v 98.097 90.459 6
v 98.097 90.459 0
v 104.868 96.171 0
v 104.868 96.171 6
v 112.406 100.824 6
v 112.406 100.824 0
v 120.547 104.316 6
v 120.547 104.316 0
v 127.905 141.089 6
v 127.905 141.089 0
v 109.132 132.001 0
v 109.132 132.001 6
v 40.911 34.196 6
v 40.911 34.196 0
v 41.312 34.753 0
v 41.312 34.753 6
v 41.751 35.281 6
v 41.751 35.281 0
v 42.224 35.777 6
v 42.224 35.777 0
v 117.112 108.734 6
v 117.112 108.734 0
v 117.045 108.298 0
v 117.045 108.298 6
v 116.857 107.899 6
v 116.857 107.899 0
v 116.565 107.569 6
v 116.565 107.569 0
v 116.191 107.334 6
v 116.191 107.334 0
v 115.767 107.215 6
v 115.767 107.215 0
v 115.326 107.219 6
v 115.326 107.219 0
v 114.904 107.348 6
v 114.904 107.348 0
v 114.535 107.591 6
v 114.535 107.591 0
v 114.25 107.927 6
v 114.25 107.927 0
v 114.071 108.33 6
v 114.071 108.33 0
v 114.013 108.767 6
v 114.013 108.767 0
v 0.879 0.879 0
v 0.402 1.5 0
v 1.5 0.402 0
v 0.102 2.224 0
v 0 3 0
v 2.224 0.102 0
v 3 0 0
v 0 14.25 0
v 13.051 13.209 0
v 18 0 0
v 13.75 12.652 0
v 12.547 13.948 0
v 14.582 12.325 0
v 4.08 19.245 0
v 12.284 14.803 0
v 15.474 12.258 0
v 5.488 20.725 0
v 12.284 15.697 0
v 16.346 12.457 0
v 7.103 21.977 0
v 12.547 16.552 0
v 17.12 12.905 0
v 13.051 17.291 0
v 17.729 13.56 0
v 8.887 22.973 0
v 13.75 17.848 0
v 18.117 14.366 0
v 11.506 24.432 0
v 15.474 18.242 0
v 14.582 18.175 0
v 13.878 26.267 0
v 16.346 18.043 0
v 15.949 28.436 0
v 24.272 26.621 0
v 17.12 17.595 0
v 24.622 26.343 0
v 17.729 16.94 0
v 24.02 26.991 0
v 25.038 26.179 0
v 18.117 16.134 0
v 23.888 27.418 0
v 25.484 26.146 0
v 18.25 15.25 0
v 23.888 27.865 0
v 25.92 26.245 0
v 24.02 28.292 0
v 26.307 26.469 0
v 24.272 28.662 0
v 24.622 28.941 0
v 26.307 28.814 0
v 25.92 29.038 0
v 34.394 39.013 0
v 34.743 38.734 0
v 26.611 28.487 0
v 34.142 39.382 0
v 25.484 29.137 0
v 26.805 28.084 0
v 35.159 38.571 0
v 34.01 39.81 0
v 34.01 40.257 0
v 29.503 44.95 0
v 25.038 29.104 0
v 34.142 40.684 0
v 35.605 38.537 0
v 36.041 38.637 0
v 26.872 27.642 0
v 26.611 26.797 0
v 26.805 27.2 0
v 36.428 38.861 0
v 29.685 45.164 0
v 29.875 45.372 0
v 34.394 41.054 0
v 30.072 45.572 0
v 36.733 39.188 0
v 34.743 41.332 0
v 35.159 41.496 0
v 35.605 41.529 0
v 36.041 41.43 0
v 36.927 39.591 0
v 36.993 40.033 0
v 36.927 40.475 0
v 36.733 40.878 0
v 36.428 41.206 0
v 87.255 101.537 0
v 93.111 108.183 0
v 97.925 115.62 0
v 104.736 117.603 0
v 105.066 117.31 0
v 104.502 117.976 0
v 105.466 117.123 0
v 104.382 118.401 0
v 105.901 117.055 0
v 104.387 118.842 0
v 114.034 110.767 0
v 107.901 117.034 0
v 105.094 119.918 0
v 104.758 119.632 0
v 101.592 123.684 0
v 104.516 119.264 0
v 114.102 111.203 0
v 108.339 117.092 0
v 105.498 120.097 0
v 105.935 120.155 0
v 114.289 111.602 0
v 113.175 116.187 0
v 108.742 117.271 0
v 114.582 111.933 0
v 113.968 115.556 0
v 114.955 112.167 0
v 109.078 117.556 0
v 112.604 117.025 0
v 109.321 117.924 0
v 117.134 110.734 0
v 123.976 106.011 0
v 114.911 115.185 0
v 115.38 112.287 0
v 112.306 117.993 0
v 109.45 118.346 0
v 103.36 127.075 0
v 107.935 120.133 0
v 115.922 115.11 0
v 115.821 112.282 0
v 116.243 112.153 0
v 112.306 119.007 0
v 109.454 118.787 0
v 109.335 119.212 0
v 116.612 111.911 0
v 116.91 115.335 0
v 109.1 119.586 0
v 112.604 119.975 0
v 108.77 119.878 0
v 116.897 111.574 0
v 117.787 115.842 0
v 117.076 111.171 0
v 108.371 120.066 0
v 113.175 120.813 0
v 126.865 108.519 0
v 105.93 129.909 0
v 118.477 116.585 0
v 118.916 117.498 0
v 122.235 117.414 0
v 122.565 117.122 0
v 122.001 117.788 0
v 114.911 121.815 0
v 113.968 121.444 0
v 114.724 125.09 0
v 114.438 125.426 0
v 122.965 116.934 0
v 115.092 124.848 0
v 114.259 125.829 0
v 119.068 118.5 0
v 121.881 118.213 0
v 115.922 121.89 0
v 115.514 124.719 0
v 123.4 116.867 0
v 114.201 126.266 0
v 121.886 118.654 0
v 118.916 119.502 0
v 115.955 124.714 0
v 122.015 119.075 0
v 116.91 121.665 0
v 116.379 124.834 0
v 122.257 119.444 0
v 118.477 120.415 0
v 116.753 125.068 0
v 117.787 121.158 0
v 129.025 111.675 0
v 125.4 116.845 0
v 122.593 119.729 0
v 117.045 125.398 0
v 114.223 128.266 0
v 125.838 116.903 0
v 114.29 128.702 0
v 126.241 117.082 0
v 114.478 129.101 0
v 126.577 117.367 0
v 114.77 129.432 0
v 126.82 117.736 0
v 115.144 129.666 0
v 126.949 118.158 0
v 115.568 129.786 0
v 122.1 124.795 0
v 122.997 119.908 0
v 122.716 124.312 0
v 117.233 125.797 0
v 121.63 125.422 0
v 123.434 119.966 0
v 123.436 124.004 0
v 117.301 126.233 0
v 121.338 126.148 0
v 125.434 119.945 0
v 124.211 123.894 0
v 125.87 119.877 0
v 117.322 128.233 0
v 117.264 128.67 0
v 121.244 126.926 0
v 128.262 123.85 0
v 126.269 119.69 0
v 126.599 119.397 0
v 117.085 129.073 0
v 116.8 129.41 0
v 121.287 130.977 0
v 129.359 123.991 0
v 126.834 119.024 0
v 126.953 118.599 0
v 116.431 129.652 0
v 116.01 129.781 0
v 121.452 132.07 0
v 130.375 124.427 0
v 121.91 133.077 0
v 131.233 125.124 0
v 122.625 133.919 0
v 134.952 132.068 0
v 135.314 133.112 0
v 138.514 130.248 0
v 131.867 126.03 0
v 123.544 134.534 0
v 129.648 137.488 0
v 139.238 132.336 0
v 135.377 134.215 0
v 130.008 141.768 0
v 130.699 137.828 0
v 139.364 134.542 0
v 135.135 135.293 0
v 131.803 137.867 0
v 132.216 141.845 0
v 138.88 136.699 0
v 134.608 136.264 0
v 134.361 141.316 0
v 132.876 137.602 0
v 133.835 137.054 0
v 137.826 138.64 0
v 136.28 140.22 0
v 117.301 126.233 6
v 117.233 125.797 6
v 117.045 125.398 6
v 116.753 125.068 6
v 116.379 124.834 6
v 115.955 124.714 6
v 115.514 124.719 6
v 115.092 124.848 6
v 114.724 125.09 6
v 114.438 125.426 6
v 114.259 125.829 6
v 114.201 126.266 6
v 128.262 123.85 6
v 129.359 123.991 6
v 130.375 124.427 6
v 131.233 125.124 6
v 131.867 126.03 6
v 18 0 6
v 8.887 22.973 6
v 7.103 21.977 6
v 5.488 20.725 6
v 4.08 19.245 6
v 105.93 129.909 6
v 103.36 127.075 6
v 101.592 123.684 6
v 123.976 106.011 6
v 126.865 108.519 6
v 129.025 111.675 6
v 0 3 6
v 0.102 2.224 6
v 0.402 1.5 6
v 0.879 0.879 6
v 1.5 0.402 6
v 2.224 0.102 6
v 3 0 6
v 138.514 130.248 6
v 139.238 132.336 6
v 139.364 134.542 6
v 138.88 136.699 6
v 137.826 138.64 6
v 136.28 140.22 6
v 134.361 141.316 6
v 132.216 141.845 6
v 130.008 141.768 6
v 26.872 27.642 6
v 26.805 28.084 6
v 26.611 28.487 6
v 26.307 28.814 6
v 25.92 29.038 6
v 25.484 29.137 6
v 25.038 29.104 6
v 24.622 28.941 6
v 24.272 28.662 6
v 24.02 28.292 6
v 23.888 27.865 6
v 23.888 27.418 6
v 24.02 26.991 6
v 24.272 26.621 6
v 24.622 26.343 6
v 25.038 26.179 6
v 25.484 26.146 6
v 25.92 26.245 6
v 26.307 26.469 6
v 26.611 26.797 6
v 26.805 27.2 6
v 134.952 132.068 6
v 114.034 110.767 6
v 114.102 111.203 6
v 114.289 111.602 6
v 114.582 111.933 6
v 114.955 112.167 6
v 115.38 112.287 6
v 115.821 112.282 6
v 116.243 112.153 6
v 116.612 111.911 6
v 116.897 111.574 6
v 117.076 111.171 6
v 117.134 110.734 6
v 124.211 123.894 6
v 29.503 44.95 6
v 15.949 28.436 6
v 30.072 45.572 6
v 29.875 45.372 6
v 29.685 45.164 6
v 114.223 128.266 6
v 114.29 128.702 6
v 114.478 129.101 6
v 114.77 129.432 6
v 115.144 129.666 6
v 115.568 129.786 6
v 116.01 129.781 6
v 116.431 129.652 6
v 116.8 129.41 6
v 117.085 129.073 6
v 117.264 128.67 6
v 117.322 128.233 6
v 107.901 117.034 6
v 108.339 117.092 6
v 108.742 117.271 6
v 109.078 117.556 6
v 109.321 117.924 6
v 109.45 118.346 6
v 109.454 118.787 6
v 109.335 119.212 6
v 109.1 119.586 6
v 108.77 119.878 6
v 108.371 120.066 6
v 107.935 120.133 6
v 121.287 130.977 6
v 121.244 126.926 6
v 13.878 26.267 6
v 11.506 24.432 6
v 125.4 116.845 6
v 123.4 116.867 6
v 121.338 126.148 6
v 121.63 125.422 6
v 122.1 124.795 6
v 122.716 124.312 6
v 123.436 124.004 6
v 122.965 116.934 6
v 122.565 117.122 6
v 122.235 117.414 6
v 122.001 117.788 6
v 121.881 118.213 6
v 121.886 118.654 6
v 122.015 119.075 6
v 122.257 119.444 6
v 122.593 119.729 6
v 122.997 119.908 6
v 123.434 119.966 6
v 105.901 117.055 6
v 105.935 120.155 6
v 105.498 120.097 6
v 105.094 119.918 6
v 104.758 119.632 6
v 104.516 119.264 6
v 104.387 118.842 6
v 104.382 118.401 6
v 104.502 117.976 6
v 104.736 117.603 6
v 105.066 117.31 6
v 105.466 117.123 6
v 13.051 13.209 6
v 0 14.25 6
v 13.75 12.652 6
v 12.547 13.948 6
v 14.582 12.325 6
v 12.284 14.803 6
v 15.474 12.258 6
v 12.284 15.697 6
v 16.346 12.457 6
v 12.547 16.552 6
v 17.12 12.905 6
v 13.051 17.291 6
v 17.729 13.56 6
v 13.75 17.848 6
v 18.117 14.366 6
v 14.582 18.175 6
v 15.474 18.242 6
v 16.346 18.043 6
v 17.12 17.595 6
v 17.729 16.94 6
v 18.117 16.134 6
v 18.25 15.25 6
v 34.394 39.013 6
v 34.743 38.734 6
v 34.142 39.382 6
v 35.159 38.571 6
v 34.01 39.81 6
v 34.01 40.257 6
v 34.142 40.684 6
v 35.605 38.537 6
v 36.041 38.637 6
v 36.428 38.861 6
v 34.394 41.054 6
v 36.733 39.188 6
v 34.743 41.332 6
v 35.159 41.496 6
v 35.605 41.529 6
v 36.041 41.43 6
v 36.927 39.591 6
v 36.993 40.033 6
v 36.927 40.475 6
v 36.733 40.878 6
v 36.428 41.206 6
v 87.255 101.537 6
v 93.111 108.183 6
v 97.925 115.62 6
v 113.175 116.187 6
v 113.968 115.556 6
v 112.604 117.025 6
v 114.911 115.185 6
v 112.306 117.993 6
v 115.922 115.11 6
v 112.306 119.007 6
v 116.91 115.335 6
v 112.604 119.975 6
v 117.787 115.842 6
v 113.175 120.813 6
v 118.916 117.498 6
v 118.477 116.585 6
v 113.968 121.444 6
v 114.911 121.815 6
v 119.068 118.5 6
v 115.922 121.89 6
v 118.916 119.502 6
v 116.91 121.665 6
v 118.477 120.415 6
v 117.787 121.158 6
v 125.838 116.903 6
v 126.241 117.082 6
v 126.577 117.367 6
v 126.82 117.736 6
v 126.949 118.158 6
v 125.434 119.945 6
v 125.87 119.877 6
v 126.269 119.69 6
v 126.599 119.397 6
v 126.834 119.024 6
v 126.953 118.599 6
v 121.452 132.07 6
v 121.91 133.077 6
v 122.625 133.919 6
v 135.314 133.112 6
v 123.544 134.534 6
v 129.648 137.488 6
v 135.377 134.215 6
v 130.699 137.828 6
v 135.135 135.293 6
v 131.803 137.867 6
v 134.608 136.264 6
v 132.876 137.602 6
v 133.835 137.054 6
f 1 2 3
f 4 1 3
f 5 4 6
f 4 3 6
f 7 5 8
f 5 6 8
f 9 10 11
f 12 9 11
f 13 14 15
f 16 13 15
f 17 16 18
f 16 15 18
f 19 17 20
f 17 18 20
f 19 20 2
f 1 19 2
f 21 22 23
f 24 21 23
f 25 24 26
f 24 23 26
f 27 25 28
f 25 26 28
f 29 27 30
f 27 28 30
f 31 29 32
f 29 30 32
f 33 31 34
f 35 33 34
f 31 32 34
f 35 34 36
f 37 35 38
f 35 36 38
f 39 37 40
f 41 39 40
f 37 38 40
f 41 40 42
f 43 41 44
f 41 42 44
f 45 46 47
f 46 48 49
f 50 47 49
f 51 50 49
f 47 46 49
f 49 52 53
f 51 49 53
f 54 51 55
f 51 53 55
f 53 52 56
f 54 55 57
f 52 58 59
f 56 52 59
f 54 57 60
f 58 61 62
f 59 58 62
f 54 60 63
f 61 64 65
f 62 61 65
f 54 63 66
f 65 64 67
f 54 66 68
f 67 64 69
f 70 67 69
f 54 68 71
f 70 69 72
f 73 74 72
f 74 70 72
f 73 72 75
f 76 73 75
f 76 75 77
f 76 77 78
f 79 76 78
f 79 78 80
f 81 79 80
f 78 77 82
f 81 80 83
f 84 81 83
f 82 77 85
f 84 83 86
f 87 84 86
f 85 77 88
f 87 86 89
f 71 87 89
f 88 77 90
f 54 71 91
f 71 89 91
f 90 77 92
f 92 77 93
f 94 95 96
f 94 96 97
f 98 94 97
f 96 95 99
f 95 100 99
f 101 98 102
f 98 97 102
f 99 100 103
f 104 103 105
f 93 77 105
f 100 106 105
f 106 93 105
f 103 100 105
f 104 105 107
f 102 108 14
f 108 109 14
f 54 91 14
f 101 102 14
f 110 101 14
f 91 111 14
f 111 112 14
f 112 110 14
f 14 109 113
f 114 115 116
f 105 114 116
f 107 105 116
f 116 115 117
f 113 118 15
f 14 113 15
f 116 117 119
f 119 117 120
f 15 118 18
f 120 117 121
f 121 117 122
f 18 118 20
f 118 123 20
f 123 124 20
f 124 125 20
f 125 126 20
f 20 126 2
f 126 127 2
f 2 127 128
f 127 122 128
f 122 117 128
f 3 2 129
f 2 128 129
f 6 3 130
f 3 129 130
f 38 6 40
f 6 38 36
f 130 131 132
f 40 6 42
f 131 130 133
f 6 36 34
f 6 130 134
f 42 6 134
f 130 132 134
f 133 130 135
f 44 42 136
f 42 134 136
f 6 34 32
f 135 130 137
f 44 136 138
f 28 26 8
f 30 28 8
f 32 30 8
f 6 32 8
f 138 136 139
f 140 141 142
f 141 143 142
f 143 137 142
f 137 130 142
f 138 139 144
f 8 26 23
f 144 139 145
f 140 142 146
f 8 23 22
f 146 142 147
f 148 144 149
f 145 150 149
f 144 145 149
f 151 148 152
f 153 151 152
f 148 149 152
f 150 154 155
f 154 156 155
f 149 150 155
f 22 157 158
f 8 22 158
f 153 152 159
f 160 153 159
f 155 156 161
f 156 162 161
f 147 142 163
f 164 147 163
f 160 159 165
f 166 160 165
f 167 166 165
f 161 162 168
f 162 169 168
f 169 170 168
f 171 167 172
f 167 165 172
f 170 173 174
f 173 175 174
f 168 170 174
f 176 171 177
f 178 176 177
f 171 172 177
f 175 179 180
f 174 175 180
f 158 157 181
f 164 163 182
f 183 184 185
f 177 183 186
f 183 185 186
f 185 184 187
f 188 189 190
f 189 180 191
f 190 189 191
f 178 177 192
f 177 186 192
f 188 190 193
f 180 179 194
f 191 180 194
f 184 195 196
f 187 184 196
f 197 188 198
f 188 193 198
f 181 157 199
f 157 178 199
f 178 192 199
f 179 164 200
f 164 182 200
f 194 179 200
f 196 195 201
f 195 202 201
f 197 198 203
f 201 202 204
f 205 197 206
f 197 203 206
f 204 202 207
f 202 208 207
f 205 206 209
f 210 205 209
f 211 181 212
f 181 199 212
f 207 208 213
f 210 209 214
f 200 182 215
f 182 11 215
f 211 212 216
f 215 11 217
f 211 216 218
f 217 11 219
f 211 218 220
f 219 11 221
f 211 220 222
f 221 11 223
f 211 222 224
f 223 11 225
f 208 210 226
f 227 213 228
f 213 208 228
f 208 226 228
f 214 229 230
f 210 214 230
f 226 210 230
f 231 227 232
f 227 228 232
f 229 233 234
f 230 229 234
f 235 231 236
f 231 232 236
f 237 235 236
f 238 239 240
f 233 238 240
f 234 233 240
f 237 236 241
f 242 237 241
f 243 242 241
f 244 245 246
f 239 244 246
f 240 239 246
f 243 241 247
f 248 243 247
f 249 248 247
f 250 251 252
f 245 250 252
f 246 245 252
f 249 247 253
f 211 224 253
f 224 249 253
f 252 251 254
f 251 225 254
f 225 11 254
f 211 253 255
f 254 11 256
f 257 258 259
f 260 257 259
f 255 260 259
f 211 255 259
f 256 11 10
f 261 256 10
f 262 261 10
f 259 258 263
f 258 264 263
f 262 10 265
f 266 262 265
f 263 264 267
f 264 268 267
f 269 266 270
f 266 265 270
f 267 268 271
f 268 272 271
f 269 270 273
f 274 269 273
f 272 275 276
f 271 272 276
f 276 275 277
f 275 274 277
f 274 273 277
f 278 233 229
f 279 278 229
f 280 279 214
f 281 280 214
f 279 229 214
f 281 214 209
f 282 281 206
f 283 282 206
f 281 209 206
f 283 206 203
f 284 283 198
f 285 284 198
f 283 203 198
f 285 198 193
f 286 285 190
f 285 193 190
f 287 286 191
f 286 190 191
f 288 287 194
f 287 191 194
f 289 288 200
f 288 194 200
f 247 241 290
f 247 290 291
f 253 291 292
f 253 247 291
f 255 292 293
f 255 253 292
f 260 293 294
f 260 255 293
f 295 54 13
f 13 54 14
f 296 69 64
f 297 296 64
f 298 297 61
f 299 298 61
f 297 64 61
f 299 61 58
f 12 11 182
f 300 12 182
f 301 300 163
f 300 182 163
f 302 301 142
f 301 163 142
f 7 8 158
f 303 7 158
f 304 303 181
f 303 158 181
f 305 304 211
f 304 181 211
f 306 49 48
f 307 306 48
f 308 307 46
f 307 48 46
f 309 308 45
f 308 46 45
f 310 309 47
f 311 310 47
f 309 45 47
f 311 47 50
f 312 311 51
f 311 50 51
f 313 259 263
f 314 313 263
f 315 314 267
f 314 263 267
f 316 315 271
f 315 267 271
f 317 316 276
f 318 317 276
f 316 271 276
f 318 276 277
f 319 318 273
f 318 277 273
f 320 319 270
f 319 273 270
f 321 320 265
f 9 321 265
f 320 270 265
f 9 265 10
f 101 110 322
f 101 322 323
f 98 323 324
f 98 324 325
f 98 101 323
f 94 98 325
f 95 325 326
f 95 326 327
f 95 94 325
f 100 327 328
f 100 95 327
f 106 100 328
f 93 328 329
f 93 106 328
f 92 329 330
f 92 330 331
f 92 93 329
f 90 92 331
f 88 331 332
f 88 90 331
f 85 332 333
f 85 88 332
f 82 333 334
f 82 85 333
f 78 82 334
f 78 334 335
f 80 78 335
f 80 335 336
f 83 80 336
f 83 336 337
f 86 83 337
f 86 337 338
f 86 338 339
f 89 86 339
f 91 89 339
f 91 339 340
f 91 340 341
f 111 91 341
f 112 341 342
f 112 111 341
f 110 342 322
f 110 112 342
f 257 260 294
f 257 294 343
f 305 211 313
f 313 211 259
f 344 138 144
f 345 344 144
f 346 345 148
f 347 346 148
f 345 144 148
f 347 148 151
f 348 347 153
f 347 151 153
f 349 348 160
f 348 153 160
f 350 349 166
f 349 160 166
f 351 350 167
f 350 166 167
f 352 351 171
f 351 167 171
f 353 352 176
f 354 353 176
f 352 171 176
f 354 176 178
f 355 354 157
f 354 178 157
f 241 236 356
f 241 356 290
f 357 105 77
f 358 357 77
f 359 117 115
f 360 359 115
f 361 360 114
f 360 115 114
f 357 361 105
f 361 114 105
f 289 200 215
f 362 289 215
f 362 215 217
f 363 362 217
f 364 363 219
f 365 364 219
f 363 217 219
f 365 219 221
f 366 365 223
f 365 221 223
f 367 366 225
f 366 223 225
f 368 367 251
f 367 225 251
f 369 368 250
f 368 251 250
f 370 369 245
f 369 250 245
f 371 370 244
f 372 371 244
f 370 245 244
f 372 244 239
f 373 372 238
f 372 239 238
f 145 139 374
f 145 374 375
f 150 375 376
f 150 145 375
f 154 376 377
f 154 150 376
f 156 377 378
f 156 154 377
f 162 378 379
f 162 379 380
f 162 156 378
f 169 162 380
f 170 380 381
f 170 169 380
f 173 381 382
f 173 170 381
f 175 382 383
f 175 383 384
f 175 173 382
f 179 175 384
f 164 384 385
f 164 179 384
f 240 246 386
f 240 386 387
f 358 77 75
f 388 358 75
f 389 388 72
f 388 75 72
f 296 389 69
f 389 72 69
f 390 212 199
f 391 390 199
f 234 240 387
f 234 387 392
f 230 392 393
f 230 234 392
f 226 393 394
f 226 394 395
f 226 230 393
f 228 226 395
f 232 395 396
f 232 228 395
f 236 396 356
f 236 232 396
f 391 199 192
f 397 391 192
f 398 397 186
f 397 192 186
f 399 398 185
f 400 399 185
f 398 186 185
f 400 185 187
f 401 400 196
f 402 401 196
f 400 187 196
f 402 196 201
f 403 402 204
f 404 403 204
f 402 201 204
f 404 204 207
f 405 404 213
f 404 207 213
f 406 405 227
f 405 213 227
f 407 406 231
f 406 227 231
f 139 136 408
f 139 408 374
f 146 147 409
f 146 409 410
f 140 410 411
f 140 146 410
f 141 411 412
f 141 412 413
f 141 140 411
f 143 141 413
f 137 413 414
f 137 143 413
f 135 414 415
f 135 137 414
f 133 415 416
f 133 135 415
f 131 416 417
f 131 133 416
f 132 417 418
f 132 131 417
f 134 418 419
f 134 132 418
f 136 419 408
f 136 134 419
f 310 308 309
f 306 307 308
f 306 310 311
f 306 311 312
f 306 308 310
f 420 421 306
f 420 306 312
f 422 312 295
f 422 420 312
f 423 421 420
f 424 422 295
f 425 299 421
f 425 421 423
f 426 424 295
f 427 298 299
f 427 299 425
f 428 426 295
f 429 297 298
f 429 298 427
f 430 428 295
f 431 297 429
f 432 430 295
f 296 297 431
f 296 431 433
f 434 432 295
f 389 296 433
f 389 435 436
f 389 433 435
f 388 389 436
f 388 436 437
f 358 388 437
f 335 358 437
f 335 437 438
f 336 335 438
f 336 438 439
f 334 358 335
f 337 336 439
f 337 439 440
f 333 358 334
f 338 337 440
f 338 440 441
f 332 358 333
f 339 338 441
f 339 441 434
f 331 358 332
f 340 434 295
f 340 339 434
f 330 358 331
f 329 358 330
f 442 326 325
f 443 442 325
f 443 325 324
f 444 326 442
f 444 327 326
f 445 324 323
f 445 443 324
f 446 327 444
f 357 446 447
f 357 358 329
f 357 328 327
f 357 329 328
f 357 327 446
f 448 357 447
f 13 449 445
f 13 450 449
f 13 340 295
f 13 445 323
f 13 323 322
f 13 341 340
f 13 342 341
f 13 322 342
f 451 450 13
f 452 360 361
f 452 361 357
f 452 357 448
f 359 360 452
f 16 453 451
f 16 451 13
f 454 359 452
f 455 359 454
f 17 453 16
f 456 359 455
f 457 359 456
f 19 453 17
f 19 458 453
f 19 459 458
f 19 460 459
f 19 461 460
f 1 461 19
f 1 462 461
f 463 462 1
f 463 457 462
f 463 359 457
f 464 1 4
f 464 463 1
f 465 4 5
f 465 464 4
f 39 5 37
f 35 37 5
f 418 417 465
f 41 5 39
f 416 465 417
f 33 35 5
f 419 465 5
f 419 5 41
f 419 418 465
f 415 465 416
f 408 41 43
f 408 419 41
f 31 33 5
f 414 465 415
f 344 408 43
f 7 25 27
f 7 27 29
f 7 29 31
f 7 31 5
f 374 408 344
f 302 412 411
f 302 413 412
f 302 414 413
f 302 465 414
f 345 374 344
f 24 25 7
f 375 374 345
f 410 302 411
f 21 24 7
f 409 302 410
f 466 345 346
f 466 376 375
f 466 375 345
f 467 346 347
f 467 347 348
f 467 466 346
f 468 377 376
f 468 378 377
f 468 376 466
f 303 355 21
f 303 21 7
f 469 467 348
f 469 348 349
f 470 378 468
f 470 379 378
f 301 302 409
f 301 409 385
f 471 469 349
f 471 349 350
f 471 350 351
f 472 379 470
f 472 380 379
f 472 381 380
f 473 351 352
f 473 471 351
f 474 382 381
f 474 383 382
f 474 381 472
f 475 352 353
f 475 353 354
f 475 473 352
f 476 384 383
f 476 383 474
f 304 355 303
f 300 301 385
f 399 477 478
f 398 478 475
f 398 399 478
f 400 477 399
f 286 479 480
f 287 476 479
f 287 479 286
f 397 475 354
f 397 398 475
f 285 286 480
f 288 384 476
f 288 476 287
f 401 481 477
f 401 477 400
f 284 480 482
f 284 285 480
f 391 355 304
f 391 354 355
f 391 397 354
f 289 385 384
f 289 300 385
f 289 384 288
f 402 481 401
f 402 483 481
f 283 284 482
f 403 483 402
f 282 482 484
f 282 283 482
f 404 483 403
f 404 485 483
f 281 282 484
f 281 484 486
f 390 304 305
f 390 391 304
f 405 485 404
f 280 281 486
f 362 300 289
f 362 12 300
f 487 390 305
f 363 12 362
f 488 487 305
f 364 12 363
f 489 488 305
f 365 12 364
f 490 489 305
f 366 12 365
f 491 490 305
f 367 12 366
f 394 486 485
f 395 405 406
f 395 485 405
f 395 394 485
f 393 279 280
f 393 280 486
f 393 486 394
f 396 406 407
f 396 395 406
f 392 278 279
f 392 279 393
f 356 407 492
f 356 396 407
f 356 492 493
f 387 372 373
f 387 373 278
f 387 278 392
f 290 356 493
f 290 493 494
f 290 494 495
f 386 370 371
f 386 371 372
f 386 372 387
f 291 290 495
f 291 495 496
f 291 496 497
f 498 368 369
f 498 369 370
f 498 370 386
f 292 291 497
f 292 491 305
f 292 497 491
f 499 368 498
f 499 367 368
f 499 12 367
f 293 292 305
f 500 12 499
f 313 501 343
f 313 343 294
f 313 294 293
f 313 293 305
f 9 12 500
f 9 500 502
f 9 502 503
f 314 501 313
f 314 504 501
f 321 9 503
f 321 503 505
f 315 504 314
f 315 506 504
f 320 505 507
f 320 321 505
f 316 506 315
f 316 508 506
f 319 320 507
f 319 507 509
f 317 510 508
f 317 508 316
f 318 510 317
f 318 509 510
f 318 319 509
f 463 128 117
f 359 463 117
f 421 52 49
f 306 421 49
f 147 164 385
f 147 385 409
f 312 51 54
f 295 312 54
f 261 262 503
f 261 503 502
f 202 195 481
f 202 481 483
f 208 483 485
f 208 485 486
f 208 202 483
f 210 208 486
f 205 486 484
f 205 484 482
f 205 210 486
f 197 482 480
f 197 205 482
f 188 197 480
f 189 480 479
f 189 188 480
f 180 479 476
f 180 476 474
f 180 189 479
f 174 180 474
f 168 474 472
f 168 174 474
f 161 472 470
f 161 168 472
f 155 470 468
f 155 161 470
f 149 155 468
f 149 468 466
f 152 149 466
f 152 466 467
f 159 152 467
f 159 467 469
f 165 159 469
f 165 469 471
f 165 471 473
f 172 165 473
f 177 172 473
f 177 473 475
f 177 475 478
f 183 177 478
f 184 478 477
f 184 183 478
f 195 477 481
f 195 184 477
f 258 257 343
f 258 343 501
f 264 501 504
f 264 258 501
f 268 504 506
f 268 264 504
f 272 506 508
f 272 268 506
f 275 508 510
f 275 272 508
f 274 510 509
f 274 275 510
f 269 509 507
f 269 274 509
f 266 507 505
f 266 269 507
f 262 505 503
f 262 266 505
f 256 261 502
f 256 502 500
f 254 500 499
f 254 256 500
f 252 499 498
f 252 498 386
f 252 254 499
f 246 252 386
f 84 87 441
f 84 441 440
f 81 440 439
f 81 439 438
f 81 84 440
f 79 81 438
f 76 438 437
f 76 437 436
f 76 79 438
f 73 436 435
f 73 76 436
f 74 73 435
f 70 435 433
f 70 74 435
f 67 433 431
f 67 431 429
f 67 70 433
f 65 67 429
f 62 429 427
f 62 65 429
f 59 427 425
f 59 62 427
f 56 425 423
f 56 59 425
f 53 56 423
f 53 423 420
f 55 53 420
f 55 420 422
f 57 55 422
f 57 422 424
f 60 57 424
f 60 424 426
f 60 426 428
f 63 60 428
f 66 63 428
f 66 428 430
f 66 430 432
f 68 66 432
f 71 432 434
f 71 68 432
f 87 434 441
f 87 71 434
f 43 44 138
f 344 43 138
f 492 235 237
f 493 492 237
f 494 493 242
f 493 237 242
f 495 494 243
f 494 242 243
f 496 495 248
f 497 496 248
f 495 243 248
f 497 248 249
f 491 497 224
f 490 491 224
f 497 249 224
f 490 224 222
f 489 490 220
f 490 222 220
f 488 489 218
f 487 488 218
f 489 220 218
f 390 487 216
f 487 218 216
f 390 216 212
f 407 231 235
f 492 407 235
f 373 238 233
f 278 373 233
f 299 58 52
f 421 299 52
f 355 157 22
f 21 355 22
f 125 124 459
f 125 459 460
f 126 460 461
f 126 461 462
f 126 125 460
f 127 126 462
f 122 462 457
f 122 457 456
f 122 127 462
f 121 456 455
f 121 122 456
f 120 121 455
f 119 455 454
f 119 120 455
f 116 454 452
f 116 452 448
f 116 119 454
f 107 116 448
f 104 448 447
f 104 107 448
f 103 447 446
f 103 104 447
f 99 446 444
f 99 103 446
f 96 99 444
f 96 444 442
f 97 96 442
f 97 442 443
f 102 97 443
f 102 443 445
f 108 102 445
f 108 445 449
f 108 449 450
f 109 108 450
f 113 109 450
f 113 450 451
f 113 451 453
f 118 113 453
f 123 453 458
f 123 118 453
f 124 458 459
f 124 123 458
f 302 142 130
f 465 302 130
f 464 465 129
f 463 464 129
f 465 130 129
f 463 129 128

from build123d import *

# Parameters (mm, degrees)
CROQUIS1_R              = 1.5
CROQUIS1_R_2            = 3
CROQUIS1_R_3            = 3.4
SALIENTE_EXTRUIR1_DEPTH = 6


with BuildPart() as part:
    # Croquis1 → Saliente-Extruir1 (new body)
    with BuildSketch(Plane.XY):
        with BuildLine():
            Line((8.1e-08, 14.249999874), (8.1e-08, 2.999999874))
            ThreePointArc((8.1e-08, 2.999999874), (0.878679737, 0.87867953), (3.000000081, -1.26e-07))
            Line((3.000000081, -1.26e-07), (18.000000081, -1.26e-07))
            Line((18.000000081, -1.26e-07), (40.911193324, 34.196329551))
            ThreePointArc((40.911193324, 34.196329551), (41.527076457, 35.020483475), (42.224381081, 35.776993874))
            Line((42.224381081, 35.776993874), (98.096843081, 90.459473874))
            ThreePointArc((98.096843081, 90.459473874), (108.550843923, 98.63680641), (120.546851363, 104.315776961))
            ThreePointArc((120.546851363, 104.315776961), (125.500442362, 107.172433842), (129.025046114, 111.675290792))
            Line((129.025046114, 111.675290792), (138.514418989, 130.248169023))
            ThreePointArc((138.514418989, 130.248169023), (137.107819922, 139.483655494), (127.90475, 141.088721))
            Line((127.90475, 141.088721), (109.131917, 132.001327))
            ThreePointArc((109.131917, 132.001327), (104.554236665, 128.574463552), (101.591616002, 123.683509744))
            ThreePointArc((101.591616002, 123.683509744), (95.655747756, 111.812521161), (87.255287964, 101.536959032))
            Line((87.255287964, 101.536959032), (30.072463964, 45.572027032))
            ThreePointArc((30.072463964, 45.572027032), (29.779023988, 45.268761189), (29.502525894, 44.949972866))
            Line((29.502525894, 44.949972866), (15.949120522, 28.43588954))
            ThreePointArc((15.949120522, 28.43588954), (12.726828906, 25.305121034), (8.887000234, 22.972613701))
            ThreePointArc((8.887000234, 22.972613701), (6.271558617, 21.381766549), (4.079708958, 19.244683353))
            Line((4.079708958, 19.244683353), (8.1e-08, 14.249999874))
        make_face()
        with Locations((25.371621, 27.641642)):
            Circle(CROQUIS1_R, mode=Mode.SUBTRACT)
        with Locations((35.493241781, 40.03328422)):
            Circle(CROQUIS1_R, mode=Mode.SUBTRACT)
        with Locations((15.25, 15.25)):
            Circle(CROQUIS1_R_2, mode=Mode.SUBTRACT)
        with Locations((115.667525989, 118.500000023)):
            Circle(CROQUIS1_R_3, mode=Mode.SUBTRACT)
        with BuildLine():
            Line((105.901407198, 117.055029782), (107.901292, 117.033504))
            ThreePointArc((107.901292, 117.033504), (109.4678845, 118.5667315), (107.934657, 120.133324))
            Line((107.934657, 120.133324), (105.934773, 120.15485))
            ThreePointArc((105.934773, 120.15485), (104.368758386, 118.621616566), (105.901407198, 117.055029782))
        make_face(mode=Mode.SUBTRACT)
        with BuildLine():
            Line((114.012675, 108.767248), (114.034201, 110.767132))
            ThreePointArc((114.034201, 110.767132), (115.6007945, 112.3003595), (117.134022, 110.733766))
            Line((117.134022, 110.733766), (117.112495218, 108.733882198))
            ThreePointArc((117.112495218, 108.733882198), (115.545908434, 107.201233386), (114.012675, 108.767248))
        make_face(mode=Mode.SUBTRACT)
        with BuildLine():
            Line((124.211353692, 123.893635573), (128.262273986, 123.850032801))
            ThreePointArc((128.262273986, 123.850032801), (130.375033742, 124.426891571), (131.867331288, 126.029878739))
            Line((131.867331288, 126.029878739), (134.952413288, 132.068090739))
            ThreePointArc((134.952413288, 132.068090739), (134.24911451, 136.685834372), (129.647579323, 137.48836746))
            Line((129.647579323, 137.48836746), (123.544360208, 134.533971661))
            ThreePointArc((123.544360208, 134.533971661), (121.909622476, 133.076524245), (121.287419986, 130.976670801))
            Line((121.287419986, 130.976670801), (121.243816986, 126.925750801))
            ThreePointArc((121.243816986, 126.925750801), (122.099613791, 124.795096288), (124.211353692, 123.893635573))
        make_face(mode=Mode.SUBTRACT)
        with BuildLine():
            Line((125.400278, 116.84515), (123.400394, 116.866676))
            ThreePointArc((123.400394, 116.866676), (121.867759233, 118.43326212), (123.433759, 119.966496))
            Line((123.433759, 119.966496), (125.433643802, 119.944970218))
            ThreePointArc((125.433643802, 119.944970218), (126.96687101, 118.378377208), (125.400278, 116.84515))
        make_face(mode=Mode.SUBTRACT)
        with BuildLine():
            Line((117.322376, 128.232752), (117.30085, 126.232868))
            ThreePointArc((117.30085, 126.232868), (115.734268362, 124.700742507), (114.201029, 126.266234))
            Line((114.201029, 126.266234), (114.222555782, 128.266117802))
            ThreePointArc((114.222555782, 128.266117802), (115.789148792, 129.79934501), (117.322376, 128.232752))
        make_face(mode=Mode.SUBTRACT)
    extrude(amount=SALIENTE_EXTRUIR1_DEPTH)


solid = part.part
